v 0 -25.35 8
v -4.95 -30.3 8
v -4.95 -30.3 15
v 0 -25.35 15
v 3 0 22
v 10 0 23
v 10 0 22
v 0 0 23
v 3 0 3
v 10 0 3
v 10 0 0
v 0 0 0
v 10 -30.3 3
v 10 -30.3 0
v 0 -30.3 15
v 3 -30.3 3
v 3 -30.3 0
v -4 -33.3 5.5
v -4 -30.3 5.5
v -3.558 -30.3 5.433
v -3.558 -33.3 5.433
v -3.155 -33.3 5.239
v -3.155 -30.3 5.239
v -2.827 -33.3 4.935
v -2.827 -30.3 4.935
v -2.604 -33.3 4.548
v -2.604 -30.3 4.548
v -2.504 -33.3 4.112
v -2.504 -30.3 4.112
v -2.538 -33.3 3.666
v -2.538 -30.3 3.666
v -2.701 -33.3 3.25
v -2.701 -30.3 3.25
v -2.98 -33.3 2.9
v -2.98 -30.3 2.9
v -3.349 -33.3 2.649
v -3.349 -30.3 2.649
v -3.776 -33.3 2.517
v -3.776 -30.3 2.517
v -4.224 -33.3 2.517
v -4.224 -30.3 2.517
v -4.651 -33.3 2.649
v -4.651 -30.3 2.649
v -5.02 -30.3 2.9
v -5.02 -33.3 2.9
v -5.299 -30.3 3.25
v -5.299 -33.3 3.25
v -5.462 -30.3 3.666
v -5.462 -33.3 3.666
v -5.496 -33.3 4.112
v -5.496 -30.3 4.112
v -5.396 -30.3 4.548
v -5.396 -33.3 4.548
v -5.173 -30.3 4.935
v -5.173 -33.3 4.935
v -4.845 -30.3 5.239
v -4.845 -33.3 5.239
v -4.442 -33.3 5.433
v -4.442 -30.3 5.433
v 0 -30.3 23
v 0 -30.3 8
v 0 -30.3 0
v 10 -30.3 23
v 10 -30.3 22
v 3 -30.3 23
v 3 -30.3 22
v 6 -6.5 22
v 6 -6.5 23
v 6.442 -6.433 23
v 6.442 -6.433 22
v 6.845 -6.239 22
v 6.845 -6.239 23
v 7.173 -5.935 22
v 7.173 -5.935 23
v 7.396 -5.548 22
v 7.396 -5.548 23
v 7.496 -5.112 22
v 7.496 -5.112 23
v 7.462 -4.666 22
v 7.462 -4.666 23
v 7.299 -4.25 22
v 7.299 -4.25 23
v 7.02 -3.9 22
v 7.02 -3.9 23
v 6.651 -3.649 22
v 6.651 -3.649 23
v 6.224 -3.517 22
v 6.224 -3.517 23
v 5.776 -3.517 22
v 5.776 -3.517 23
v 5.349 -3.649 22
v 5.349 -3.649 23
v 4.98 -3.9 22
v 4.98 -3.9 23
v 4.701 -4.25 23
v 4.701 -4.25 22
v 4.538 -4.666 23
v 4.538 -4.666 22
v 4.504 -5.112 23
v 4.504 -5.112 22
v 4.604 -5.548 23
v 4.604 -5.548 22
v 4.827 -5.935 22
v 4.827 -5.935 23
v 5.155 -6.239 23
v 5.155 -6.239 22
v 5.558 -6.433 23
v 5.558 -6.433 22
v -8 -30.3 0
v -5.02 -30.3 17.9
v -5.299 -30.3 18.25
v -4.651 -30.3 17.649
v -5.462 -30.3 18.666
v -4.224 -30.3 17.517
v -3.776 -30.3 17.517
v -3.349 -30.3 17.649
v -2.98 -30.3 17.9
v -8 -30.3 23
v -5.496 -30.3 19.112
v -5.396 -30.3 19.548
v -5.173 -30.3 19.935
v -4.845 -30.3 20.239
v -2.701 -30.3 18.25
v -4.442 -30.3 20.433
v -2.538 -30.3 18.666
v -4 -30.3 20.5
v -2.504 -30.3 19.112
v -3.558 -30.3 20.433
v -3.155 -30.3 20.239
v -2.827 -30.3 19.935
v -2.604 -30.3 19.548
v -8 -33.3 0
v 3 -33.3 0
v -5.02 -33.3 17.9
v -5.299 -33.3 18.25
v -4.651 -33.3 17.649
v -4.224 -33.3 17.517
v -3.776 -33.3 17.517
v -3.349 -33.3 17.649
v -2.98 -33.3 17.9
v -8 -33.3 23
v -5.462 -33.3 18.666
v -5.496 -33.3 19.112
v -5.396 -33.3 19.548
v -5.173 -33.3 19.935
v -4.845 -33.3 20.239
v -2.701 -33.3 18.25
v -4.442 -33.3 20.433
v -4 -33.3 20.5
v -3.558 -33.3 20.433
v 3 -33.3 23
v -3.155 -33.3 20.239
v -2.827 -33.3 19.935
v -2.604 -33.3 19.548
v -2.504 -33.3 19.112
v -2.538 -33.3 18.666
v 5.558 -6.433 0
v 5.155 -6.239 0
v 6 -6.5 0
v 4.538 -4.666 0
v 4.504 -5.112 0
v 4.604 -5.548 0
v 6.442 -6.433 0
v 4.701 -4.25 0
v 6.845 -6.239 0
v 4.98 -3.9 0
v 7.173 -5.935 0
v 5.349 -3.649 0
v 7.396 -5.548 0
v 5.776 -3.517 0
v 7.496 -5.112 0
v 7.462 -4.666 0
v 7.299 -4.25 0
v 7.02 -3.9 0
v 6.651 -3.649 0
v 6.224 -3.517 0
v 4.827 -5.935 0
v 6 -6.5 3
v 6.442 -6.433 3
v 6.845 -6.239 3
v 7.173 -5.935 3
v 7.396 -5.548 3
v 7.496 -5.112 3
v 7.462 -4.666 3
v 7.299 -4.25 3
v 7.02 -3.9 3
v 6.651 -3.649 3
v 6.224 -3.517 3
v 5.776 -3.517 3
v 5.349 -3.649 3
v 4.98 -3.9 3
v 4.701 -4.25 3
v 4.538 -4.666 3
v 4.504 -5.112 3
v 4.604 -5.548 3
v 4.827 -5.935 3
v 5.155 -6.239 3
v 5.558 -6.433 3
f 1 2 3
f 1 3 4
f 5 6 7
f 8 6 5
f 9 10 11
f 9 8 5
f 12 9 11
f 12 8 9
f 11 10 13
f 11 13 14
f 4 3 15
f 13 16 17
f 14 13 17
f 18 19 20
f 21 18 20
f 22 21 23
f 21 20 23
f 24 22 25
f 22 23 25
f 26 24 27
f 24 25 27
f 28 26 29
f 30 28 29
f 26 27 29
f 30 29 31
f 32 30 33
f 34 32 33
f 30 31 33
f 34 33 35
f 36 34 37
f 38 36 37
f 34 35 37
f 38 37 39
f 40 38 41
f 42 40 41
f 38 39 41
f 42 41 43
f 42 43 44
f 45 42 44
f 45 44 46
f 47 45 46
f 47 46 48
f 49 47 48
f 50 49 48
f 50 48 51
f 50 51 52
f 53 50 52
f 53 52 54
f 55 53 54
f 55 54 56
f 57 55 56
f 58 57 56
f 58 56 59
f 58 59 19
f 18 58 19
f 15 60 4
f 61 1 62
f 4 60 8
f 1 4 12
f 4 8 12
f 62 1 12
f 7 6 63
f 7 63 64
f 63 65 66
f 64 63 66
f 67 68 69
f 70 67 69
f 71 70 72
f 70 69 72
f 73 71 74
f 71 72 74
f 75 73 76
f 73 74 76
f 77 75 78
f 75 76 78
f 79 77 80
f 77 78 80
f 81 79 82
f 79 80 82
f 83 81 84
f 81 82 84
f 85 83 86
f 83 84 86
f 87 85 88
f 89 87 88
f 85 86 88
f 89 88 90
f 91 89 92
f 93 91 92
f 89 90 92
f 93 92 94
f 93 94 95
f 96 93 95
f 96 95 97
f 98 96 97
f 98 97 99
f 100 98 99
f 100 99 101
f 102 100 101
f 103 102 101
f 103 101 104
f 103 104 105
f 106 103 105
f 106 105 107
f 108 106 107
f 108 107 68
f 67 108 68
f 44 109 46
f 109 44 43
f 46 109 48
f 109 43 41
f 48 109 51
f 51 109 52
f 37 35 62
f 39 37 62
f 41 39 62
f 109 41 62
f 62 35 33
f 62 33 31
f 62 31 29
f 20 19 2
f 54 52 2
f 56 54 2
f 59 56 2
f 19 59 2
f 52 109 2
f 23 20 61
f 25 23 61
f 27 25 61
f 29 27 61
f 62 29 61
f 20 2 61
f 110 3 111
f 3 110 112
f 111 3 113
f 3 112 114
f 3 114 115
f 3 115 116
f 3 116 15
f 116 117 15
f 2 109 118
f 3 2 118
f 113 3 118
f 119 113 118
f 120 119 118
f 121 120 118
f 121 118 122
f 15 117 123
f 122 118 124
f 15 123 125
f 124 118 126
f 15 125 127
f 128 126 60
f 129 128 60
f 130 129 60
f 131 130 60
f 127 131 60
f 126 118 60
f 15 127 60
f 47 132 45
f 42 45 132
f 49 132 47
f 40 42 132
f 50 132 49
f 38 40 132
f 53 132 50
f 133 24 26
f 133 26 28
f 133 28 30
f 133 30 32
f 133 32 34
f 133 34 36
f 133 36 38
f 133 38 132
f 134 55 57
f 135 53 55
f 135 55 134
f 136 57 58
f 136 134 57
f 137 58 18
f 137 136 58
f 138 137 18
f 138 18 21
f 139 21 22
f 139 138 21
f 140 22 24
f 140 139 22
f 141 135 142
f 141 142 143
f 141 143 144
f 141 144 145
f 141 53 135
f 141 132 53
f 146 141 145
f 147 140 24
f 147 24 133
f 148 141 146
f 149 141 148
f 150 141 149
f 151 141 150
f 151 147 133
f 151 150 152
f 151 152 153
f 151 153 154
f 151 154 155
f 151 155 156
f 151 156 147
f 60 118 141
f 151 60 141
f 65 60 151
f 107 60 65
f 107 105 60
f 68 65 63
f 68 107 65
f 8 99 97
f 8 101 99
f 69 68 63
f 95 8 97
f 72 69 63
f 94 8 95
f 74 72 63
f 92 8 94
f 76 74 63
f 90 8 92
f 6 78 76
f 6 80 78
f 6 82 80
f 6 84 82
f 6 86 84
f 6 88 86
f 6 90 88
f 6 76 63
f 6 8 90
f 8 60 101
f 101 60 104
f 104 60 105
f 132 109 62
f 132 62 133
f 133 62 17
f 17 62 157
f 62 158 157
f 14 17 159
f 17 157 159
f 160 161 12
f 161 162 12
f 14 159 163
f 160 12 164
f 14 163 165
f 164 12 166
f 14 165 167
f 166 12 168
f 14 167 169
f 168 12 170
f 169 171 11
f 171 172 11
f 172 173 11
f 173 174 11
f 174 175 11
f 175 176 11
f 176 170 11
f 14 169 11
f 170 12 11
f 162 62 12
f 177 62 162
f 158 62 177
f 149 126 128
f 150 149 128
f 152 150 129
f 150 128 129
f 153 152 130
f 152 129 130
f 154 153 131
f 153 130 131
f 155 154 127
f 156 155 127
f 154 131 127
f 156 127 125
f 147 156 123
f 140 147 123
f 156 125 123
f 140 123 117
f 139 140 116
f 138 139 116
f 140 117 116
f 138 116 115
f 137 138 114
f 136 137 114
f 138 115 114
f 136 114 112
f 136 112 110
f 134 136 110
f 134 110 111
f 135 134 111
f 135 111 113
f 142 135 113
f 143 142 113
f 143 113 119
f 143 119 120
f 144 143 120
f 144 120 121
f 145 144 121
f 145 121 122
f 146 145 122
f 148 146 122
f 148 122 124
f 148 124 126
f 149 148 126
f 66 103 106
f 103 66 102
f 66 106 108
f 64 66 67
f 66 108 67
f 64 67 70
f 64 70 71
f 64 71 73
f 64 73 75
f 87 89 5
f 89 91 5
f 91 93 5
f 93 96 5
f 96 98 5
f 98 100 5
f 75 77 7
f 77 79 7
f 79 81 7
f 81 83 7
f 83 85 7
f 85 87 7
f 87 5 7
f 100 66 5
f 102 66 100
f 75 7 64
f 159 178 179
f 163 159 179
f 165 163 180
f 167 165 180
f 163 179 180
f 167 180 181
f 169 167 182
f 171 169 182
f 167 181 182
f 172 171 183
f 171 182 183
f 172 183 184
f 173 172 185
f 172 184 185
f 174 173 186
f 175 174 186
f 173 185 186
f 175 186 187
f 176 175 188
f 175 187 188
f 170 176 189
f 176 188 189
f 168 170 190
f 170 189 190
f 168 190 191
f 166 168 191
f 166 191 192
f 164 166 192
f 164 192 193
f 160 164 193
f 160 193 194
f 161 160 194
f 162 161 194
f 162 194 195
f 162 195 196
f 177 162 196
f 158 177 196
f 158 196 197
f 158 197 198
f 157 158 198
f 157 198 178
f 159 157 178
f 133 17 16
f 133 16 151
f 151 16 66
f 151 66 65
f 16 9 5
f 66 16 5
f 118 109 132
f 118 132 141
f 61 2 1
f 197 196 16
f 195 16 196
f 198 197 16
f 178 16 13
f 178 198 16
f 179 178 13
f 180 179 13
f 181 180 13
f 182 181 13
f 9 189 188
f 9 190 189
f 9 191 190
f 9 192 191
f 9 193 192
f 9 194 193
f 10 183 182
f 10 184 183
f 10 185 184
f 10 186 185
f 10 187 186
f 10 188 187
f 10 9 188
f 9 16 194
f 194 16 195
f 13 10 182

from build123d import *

# Parameters (mm, degrees)
CROQUIS1_W              = 23
CROQUIS1_H              = 30.3
SALIENTE_EXTRUIR2_DEPTH = 10
CROQUIS3_W              = 7
CROQUIS3_H              = 19
CORTAR_EXTRUIR1_DEPTH   = 40.333064971
CROQUIS4_W              = 11
CROQUIS4_H              = 23
SALIENTE_EXTRUIR3_DEPTH = 3
CROQUIS5_R              = 1.5
CORTAR_EXTRUIR3_DEPTH   = 40.333064971
CROQUIS6_R              = 1.5
CORTAR_EXTRUIR4_DEPTH   = 42.688007868
NERVIO10_REACH          = 38.622
CROQUIS23_WALL_W        = 82.243156676
CROQUIS23_WALL_H        = 7


with BuildPart() as part:
    # Croquis1 → Saliente-Extruir2 (new body)
    with BuildSketch(Plane(origin=(0, 0, 0), x_dir=(0, 0, -1), z_dir=(1, 0, 0))):
        with Locations((-11.5, -15.15)):
            Rectangle(CROQUIS1_W, CROQUIS1_H)
    extrude(amount=SALIENTE_EXTRUIR2_DEPTH)

    # Croquis3 → Cortar-Extruir1 (cut, through all)
    with BuildSketch(Plane(origin=(0, 0, 0), x_dir=(1, 0, 0), z_dir=(0, 1, 0))):
        with Locations((6.5, -12.5)):
            Rectangle(CROQUIS3_W, CROQUIS3_H)
    extrude(amount=-CORTAR_EXTRUIR1_DEPTH, mode=Mode.SUBTRACT)

    # Croquis4 → Saliente-Extruir3 (add)
    with BuildSketch(Plane.XZ.offset(30.3)):
        with Locations((-2.5, 11.5)):
            Rectangle(CROQUIS4_W, CROQUIS4_H)
    extrude(amount=SALIENTE_EXTRUIR3_DEPTH)

    # Croquis5 → Cortar-Extruir3 (cut, through all)
    with BuildSketch(Plane(origin=(0, -30.3, 0), x_dir=(1, 0, 0), z_dir=(0, 1, 0))):
        with Locations(Location((-4, -4, 0), (0, 0, 270))):
            Circle(CROQUIS5_R)
        with Locations(Location((-4, -19, 0), (0, 0, 270))):
            Circle(CROQUIS5_R)
    extrude(amount=-CORTAR_EXTRUIR3_DEPTH, mode=Mode.SUBTRACT)

    # Croquis6 → Cortar-Extruir4 (cut, through all)
    with BuildSketch(Plane.XY.offset(23)):
        with Locations(Location((6, -5, 0), (0, 0, 270))):
            Circle(CROQUIS6_R)
    extrude(amount=-CORTAR_EXTRUIR4_DEPTH, mode=Mode.SUBTRACT)

    # Croquis23 wall → Nervio10 (add, up to next)
    with BuildSketch(Plane(origin=(-2.474873734, -27.825126266, 11.5), x_dir=(0.707106781187, 0.707106781187, 0), z_dir=(-0.707106781187, 0.707106781187, 0)), mode=Mode.PRIVATE) as nervio10_sk1:
        Rectangle(CROQUIS23_WALL_W, CROQUIS23_WALL_H)
    nervio10_tool1 = extrude(nervio10_sk1.sketch, amount=-NERVIO10_REACH, mode=Mode.PRIVATE) - part.part
    add(nervio10_tool1.solids().sort_by_distance((-2.474873734, -27.825126266, 11.5))[0])


solid = part.part
